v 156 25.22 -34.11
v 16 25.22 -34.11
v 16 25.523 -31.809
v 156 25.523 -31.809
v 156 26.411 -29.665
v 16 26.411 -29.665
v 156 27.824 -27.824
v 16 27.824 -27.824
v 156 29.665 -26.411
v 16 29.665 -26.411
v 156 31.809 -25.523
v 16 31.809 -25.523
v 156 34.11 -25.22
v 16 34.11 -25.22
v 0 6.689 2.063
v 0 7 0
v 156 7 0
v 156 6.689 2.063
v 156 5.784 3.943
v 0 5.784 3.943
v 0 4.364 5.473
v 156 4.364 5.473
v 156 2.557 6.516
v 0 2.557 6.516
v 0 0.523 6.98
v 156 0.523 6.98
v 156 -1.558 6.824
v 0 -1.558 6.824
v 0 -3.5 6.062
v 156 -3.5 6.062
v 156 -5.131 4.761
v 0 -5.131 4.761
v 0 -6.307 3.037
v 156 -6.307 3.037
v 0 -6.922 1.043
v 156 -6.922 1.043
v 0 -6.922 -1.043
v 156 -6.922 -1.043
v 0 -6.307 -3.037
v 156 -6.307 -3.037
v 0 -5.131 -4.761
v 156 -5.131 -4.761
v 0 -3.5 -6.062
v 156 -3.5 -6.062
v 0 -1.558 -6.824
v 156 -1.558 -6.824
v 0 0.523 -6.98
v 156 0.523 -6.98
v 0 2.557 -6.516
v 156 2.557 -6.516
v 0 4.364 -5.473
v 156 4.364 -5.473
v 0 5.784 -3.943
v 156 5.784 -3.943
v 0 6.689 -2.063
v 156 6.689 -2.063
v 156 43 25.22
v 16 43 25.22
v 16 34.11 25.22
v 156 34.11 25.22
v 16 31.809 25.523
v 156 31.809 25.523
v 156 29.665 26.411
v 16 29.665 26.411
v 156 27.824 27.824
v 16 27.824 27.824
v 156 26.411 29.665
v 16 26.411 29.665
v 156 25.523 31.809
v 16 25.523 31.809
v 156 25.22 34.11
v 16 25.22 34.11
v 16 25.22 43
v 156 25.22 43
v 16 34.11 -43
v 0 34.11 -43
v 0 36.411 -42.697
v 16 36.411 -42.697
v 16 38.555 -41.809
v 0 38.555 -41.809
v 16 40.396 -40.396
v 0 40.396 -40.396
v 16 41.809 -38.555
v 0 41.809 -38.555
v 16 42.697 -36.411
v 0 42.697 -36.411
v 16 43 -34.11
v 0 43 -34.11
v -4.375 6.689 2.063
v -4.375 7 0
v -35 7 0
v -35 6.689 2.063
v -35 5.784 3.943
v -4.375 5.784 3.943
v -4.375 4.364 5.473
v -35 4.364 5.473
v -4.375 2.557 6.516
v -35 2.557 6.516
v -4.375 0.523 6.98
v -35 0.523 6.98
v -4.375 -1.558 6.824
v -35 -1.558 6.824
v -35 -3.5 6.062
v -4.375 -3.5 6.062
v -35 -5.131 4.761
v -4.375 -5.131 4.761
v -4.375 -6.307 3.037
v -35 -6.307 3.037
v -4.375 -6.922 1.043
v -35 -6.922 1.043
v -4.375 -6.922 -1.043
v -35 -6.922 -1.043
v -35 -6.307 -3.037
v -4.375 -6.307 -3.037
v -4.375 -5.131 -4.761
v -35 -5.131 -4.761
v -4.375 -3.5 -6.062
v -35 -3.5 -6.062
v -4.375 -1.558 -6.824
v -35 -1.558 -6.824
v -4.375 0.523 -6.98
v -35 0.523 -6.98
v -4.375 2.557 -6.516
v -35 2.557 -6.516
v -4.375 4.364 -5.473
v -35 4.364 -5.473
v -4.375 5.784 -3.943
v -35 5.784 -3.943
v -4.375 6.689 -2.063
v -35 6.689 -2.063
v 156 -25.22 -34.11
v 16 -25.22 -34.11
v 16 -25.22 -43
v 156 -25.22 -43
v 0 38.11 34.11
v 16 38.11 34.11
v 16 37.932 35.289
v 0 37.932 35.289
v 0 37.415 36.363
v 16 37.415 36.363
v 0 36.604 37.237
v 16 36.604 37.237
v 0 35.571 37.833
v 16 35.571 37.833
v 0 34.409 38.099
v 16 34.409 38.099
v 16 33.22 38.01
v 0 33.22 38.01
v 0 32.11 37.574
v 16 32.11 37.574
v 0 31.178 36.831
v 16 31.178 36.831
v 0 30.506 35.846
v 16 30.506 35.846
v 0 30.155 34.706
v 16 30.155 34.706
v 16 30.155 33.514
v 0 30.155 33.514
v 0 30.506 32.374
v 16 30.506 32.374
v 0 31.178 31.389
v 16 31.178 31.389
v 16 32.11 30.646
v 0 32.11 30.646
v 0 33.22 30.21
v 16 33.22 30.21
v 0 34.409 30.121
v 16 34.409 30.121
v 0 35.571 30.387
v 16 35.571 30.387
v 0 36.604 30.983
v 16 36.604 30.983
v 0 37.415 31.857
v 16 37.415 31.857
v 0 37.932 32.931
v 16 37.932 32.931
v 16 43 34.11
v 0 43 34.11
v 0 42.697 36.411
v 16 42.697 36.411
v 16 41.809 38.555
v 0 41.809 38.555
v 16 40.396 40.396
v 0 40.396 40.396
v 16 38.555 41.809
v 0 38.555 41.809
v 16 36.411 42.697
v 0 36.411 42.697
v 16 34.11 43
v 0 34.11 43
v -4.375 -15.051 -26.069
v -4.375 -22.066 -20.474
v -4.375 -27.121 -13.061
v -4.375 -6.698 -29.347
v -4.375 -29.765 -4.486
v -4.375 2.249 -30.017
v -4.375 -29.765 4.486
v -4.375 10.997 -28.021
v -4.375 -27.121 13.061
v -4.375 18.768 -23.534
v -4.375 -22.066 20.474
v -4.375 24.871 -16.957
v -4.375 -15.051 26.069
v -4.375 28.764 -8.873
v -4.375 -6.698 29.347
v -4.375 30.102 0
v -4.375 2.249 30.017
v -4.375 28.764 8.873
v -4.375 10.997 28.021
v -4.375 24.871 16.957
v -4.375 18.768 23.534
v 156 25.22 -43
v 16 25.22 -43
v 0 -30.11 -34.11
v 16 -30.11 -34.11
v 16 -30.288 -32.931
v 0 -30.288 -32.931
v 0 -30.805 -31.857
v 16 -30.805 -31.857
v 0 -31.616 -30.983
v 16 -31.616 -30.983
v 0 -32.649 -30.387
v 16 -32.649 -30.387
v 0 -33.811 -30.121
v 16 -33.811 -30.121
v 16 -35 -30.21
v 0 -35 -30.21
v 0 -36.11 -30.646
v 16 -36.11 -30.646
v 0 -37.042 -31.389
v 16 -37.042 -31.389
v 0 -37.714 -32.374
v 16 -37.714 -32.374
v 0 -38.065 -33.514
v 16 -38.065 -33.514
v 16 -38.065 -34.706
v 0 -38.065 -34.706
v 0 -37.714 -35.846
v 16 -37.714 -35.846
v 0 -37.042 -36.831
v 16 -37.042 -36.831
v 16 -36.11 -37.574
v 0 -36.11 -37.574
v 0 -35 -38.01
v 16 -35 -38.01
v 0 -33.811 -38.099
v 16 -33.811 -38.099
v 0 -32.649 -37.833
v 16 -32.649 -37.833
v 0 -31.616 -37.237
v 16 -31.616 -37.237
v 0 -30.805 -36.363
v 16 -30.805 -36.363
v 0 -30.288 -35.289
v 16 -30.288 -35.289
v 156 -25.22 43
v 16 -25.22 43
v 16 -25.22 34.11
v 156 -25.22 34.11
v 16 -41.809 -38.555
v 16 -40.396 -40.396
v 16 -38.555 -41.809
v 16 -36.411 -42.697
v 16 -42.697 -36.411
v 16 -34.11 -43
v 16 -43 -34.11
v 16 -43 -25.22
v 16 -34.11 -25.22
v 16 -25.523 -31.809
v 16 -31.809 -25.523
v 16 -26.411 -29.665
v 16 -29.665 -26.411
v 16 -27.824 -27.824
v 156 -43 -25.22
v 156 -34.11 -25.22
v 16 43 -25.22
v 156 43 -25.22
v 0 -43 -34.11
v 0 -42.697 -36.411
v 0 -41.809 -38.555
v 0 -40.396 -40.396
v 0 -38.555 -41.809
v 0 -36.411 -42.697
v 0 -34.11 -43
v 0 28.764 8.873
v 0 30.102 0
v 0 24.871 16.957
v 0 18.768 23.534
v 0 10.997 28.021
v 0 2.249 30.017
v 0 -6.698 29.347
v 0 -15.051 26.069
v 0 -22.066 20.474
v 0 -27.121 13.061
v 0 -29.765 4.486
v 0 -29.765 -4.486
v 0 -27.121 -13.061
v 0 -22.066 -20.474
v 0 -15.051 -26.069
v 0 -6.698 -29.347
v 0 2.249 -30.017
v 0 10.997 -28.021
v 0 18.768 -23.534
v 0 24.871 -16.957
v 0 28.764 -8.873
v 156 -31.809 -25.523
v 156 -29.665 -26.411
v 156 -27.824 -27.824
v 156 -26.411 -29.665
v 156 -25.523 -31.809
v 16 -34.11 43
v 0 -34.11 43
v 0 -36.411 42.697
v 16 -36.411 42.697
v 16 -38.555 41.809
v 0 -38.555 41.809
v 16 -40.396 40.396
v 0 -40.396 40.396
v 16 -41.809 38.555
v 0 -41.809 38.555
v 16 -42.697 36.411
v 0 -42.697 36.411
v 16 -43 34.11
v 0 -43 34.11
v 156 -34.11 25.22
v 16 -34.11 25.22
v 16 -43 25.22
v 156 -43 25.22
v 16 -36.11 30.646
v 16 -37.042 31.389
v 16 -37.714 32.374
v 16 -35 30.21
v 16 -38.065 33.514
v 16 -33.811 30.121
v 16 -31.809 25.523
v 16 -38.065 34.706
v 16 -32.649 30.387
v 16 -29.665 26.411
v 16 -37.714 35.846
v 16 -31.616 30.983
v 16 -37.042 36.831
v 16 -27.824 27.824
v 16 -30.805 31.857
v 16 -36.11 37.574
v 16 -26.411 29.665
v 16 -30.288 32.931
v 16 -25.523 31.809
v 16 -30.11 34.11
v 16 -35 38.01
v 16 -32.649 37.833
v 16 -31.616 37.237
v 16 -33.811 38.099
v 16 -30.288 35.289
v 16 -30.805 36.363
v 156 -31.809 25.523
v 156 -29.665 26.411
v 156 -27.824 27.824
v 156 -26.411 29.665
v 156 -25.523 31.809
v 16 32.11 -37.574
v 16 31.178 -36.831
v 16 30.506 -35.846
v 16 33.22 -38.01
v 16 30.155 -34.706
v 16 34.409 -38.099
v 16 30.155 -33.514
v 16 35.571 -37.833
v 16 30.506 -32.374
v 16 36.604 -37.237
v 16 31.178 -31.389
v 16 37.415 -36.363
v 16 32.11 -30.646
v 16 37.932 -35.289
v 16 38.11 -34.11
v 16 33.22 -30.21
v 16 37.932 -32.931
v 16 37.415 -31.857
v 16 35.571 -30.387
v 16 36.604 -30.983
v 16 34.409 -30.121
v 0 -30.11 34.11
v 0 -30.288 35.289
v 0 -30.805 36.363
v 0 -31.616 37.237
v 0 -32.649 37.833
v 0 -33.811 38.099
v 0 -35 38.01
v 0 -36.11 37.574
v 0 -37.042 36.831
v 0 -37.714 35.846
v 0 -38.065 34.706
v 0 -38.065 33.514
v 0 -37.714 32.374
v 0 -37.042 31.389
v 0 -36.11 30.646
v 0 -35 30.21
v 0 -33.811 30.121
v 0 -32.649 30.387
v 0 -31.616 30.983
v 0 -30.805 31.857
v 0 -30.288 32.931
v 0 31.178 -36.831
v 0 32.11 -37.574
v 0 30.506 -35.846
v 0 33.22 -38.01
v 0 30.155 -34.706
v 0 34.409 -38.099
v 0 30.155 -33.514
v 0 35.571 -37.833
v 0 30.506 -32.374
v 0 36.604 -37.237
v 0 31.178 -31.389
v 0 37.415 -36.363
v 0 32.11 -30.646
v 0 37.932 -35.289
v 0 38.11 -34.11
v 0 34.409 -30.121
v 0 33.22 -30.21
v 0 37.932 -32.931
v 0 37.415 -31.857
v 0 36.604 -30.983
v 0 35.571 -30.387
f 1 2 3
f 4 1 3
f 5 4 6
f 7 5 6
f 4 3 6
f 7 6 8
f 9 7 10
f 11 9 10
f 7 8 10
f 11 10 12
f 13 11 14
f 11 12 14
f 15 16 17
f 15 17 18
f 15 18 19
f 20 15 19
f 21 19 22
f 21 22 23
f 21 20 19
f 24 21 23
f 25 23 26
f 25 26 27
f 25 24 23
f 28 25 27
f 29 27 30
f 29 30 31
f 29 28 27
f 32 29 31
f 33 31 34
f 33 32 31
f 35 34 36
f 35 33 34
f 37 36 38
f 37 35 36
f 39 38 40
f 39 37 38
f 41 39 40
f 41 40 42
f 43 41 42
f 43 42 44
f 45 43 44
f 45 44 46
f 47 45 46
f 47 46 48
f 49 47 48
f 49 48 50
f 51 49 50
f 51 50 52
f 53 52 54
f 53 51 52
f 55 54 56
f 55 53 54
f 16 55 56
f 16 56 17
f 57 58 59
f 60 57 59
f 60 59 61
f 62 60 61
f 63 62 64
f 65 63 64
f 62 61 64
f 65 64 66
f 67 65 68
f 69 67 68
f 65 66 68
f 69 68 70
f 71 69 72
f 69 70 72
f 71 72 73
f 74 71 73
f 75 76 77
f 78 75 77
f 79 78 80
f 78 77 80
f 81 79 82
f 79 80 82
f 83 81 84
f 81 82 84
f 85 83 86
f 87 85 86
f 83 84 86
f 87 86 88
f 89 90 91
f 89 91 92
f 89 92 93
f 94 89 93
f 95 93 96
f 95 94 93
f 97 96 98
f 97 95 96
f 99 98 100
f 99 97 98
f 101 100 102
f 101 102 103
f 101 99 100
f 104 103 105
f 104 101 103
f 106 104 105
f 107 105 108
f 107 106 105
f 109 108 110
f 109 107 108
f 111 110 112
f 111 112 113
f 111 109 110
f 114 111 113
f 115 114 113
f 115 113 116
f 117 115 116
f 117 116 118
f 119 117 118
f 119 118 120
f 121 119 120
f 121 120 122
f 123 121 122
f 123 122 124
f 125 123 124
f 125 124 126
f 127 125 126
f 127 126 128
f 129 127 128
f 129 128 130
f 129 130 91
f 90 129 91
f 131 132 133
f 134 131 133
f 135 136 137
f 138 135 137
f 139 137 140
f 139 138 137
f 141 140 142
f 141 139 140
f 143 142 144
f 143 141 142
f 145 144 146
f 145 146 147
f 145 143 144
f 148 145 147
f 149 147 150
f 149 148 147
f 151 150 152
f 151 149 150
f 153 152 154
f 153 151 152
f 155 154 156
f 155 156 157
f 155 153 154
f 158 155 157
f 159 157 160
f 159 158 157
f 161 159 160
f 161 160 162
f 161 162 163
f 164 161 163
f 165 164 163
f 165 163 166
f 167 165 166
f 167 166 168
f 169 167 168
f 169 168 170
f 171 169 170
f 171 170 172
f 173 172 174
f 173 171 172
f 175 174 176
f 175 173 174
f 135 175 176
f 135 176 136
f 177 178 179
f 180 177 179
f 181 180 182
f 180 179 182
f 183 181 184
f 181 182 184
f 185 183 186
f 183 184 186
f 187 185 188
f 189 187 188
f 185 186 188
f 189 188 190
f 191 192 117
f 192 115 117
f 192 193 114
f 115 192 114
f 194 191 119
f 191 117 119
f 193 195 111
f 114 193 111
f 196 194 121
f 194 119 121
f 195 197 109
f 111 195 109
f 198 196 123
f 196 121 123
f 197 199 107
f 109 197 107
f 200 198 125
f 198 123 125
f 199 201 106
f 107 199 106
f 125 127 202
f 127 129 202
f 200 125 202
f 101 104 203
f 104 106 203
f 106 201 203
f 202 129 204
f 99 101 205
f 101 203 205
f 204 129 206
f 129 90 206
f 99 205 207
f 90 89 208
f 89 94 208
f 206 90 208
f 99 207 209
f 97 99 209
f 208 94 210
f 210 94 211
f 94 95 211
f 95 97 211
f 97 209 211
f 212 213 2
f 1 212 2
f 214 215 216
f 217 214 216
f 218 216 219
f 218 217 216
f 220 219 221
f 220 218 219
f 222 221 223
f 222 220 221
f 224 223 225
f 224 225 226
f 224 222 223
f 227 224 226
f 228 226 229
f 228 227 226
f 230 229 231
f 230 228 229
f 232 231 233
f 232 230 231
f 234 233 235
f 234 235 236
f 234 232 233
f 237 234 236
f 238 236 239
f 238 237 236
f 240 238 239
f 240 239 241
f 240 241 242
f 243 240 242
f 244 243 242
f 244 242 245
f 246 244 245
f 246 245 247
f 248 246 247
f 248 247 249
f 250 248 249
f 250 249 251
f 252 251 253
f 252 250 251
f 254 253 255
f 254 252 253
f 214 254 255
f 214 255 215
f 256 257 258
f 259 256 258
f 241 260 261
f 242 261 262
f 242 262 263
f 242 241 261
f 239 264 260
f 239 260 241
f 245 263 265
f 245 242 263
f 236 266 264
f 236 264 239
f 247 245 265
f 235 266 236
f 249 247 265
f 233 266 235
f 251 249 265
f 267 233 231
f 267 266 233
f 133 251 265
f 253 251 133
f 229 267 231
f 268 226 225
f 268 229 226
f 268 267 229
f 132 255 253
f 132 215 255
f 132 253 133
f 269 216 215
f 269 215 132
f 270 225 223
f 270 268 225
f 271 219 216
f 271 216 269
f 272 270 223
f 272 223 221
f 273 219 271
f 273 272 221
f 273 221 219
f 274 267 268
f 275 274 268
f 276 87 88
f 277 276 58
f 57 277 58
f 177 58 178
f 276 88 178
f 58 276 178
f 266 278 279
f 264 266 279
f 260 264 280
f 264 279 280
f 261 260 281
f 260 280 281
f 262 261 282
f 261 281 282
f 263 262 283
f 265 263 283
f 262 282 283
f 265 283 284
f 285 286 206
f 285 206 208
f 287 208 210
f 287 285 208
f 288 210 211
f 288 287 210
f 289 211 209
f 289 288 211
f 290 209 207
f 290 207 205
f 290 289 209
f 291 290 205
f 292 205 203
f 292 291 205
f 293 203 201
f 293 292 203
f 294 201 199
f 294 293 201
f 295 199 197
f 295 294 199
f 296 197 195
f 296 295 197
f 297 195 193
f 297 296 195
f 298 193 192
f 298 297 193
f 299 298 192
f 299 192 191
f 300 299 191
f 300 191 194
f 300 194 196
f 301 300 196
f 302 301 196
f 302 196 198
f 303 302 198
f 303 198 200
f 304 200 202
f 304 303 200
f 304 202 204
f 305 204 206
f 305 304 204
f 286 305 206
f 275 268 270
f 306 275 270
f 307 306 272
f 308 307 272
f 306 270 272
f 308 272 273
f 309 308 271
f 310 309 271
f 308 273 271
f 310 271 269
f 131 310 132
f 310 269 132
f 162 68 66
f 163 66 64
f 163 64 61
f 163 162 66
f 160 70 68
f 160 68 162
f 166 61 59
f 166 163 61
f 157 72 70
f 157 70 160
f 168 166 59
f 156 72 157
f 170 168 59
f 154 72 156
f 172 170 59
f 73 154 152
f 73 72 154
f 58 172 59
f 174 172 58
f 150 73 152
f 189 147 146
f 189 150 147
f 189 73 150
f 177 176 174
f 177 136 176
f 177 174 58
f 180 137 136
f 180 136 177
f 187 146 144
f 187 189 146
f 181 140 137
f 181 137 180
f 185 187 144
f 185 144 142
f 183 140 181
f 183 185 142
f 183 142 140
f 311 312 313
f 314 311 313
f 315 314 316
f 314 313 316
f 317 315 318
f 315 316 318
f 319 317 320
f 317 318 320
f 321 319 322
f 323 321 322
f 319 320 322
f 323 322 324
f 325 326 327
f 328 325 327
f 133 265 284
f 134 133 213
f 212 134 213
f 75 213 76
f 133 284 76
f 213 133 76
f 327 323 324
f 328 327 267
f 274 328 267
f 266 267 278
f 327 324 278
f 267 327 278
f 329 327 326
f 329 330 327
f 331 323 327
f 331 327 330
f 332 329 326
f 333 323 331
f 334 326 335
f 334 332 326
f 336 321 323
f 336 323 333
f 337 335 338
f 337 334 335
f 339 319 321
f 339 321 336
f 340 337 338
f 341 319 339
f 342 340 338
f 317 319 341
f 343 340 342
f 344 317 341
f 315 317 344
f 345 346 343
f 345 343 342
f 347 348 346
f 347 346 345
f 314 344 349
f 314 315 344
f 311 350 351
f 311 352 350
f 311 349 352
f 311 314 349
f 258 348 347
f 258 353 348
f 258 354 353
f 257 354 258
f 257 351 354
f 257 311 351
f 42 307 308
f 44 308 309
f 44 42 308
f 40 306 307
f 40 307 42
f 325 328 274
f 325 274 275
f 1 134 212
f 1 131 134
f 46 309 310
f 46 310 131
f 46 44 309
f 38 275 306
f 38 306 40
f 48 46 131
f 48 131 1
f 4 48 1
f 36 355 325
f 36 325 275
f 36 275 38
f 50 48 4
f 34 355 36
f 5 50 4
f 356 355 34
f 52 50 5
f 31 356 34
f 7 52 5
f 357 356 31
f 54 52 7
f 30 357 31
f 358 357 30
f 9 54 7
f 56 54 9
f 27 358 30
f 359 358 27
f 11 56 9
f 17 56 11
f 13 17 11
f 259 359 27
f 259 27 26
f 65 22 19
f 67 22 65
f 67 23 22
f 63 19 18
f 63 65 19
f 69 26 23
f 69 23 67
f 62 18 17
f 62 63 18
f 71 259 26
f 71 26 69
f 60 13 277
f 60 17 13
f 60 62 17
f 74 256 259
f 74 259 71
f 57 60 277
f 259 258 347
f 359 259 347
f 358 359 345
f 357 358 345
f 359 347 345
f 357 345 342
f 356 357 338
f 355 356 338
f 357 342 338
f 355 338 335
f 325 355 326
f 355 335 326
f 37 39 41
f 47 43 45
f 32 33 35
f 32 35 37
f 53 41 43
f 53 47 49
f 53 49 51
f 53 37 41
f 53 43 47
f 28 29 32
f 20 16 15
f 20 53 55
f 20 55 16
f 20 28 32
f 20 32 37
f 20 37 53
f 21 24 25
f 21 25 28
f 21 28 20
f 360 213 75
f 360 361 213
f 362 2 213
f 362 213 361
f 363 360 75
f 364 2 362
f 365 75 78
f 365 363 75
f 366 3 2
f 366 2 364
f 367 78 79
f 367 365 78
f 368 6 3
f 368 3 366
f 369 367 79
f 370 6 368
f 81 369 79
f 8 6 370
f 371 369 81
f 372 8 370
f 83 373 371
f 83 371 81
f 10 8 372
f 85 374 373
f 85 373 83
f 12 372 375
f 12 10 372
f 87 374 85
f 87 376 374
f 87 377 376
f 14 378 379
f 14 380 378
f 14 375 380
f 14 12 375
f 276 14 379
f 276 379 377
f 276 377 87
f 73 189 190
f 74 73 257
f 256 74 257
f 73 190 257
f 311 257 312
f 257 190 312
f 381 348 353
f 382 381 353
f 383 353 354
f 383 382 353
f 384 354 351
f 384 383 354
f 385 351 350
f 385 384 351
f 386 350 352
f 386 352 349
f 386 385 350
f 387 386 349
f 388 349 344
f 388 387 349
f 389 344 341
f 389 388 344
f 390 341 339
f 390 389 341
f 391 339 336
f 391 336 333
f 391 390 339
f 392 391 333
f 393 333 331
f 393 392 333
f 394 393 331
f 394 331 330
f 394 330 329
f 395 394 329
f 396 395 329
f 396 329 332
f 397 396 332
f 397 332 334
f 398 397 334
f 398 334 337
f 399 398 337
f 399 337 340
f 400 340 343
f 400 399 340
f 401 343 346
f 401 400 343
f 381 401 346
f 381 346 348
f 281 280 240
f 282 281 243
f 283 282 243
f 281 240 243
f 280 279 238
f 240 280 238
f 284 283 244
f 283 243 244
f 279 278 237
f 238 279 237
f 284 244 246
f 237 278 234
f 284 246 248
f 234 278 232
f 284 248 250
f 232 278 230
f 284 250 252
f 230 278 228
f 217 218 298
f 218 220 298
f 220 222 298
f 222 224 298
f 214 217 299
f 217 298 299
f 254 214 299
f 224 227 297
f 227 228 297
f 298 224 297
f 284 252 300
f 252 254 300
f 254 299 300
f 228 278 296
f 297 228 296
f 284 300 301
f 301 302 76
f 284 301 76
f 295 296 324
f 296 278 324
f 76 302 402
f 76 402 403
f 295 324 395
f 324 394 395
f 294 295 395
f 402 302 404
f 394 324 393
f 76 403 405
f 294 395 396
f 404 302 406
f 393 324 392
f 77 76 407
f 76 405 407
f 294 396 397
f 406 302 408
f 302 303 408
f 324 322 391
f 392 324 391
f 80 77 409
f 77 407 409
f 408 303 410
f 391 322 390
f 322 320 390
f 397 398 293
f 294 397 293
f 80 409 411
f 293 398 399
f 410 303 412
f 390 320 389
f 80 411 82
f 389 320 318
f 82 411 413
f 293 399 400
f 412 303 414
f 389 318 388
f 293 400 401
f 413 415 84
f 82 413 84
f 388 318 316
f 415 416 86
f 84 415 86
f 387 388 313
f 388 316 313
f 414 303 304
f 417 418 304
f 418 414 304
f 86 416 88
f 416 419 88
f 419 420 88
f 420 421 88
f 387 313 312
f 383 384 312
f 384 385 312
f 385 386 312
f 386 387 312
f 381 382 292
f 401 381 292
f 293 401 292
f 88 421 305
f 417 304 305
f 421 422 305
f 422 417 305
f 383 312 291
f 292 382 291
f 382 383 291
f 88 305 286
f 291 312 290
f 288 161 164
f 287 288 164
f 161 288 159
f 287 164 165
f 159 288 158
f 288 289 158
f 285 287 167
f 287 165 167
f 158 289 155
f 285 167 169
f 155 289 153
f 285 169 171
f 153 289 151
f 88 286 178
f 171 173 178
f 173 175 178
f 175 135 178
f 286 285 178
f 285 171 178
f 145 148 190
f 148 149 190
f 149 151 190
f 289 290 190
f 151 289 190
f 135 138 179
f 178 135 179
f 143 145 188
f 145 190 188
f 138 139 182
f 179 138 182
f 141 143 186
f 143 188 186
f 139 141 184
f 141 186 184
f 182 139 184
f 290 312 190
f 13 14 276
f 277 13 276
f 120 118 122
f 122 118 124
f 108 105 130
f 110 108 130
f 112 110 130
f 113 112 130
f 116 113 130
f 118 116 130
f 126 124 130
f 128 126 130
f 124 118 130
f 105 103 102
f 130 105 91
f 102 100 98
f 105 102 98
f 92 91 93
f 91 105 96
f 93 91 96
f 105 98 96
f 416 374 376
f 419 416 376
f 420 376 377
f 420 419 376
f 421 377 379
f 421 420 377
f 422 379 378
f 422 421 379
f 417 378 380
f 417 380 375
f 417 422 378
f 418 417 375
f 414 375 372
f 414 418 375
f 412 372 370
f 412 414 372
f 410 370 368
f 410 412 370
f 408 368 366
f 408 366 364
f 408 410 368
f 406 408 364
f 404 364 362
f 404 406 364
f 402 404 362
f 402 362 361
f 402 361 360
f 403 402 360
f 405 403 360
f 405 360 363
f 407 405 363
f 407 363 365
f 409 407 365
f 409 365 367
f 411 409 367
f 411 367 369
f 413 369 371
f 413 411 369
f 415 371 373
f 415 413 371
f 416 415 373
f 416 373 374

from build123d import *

# Parameters (mm, degrees)
F0_R     = 7
F1_DEPTH = 35
F0_R_2   = 30.10154
F2_DEPTH = 4.375
F3_DEPTH = 156
F0_R_3   = 4
F4_DEPTH = 16


with BuildPart() as f1:
    # F0 (on Right) → F1 (new body)
    with BuildSketch(Plane.YZ):
        Circle(F0_R)
    extrude(amount=-F1_DEPTH)

    # F0 (on Right) → F2 (join)
    with BuildSketch(Plane.YZ):
        Circle(F0_R_2)
        Circle(F0_R, mode=Mode.SUBTRACT)
    extrude(amount=-F2_DEPTH)

    # F0 (on Right) → F3 (join)
    with BuildSketch(Plane.YZ):
        with BuildLine():
            Line((-25.22, -43), (25.22, -43))
            Line((25.22, -43), (25.22, -34.11))
            ThreePointArc((25.22, -34.11), (27.8238207153, -27.8238207153), (34.11, -25.22))
            Line((34.11, -25.22), (43, -25.22))
            Line((43, -25.22), (43, 25.22))
            Line((43, 25.22), (34.11, 25.22))
            ThreePointArc((34.11, 25.22), (27.8238207153, 27.8238207153), (25.22, 34.11))
            Line((25.22, 34.11), (25.22, 43))
            Line((25.22, 43), (-25.22, 43))
            Line((-25.22, 43), (-25.22, 34.11))
            ThreePointArc((-25.22, 34.11), (-27.8238207153, 27.8238207153), (-34.11, 25.22))
            Line((-34.11, 25.22), (-43, 25.22))
            Line((-43, 25.22), (-43, -25.22))
            Line((-43, -25.22), (-34.11, -25.22))
            ThreePointArc((-34.11, -25.22), (-27.8238207153, -27.8238207153), (-25.22, -34.11))
            Line((-25.22, -34.11), (-25.22, -43))
        make_face()
        Circle(F0_R_2, mode=Mode.SUBTRACT)
        Circle(F0_R_2)
        Circle(F0_R, mode=Mode.SUBTRACT)
    extrude(amount=F3_DEPTH)

    # F0 (on Right) → F4 (join)
    with BuildSketch(Plane.YZ):
        with BuildLine():
            Line((-43, 34.11), (-43, 25.22))
            Line((-43, 25.22), (-34.11, 25.22))
            ThreePointArc((-34.11, 25.22), (-27.8238207153, 27.8238207153), (-25.22, 34.11))
            Line((-25.22, 34.11), (-25.22, 43))
            Line((-25.22, 43), (-34.11, 43))
            ThreePointArc((-34.11, 43), (-40.3961792847, 40.3961792847), (-43, 34.11))
        make_face()
        with Locations((-34.11, 34.11)):
            Circle(F0_R_3, mode=Mode.SUBTRACT)
        with BuildLine():
            Line((34.11, 25.22), (43, 25.22))
            Line((43, 25.22), (43, 34.11))
            ThreePointArc((43, 34.11), (40.3961792847, 40.3961792847), (34.11, 43))
            Line((34.11, 43), (25.22, 43))
            Line((25.22, 43), (25.22, 34.11))
            ThreePointArc((25.22, 34.11), (27.8238207153, 27.8238207153), (34.11, 25.22))
        make_face()
        with Locations((34.11, 34.11)):
            Circle(F0_R_3, mode=Mode.SUBTRACT)
        with BuildLine():
            Line((25.22, -43), (34.11, -43))
            ThreePointArc((34.11, -43), (40.3961792847, -40.3961792847), (43, -34.11))
            Line((43, -34.11), (43, -25.22))
            Line((43, -25.22), (34.11, -25.22))
            ThreePointArc((34.11, -25.22), (27.8238207153, -27.8238207153), (25.22, -34.11))
            Line((25.22, -34.11), (25.22, -43))
        make_face()
        with Locations((34.11, -34.11)):
            Circle(F0_R_3, mode=Mode.SUBTRACT)
        with BuildLine():
            Line((-34.11, -43), (-25.22, -43))
            Line((-25.22, -43), (-25.22, -34.11))
            ThreePointArc((-25.22, -34.11), (-27.8238207153, -27.8238207153), (-34.11, -25.22))
            Line((-34.11, -25.22), (-43, -25.22))
            Line((-43, -25.22), (-43, -34.11))
            ThreePointArc((-43, -34.11), (-40.3961792847, -40.3961792847), (-34.11, -43))
        make_face()
        with Locations((-34.11, -34.11)):
            Circle(F0_R_3, mode=Mode.SUBTRACT)
    extrude(amount=F4_DEPTH)


solid = f1.part
